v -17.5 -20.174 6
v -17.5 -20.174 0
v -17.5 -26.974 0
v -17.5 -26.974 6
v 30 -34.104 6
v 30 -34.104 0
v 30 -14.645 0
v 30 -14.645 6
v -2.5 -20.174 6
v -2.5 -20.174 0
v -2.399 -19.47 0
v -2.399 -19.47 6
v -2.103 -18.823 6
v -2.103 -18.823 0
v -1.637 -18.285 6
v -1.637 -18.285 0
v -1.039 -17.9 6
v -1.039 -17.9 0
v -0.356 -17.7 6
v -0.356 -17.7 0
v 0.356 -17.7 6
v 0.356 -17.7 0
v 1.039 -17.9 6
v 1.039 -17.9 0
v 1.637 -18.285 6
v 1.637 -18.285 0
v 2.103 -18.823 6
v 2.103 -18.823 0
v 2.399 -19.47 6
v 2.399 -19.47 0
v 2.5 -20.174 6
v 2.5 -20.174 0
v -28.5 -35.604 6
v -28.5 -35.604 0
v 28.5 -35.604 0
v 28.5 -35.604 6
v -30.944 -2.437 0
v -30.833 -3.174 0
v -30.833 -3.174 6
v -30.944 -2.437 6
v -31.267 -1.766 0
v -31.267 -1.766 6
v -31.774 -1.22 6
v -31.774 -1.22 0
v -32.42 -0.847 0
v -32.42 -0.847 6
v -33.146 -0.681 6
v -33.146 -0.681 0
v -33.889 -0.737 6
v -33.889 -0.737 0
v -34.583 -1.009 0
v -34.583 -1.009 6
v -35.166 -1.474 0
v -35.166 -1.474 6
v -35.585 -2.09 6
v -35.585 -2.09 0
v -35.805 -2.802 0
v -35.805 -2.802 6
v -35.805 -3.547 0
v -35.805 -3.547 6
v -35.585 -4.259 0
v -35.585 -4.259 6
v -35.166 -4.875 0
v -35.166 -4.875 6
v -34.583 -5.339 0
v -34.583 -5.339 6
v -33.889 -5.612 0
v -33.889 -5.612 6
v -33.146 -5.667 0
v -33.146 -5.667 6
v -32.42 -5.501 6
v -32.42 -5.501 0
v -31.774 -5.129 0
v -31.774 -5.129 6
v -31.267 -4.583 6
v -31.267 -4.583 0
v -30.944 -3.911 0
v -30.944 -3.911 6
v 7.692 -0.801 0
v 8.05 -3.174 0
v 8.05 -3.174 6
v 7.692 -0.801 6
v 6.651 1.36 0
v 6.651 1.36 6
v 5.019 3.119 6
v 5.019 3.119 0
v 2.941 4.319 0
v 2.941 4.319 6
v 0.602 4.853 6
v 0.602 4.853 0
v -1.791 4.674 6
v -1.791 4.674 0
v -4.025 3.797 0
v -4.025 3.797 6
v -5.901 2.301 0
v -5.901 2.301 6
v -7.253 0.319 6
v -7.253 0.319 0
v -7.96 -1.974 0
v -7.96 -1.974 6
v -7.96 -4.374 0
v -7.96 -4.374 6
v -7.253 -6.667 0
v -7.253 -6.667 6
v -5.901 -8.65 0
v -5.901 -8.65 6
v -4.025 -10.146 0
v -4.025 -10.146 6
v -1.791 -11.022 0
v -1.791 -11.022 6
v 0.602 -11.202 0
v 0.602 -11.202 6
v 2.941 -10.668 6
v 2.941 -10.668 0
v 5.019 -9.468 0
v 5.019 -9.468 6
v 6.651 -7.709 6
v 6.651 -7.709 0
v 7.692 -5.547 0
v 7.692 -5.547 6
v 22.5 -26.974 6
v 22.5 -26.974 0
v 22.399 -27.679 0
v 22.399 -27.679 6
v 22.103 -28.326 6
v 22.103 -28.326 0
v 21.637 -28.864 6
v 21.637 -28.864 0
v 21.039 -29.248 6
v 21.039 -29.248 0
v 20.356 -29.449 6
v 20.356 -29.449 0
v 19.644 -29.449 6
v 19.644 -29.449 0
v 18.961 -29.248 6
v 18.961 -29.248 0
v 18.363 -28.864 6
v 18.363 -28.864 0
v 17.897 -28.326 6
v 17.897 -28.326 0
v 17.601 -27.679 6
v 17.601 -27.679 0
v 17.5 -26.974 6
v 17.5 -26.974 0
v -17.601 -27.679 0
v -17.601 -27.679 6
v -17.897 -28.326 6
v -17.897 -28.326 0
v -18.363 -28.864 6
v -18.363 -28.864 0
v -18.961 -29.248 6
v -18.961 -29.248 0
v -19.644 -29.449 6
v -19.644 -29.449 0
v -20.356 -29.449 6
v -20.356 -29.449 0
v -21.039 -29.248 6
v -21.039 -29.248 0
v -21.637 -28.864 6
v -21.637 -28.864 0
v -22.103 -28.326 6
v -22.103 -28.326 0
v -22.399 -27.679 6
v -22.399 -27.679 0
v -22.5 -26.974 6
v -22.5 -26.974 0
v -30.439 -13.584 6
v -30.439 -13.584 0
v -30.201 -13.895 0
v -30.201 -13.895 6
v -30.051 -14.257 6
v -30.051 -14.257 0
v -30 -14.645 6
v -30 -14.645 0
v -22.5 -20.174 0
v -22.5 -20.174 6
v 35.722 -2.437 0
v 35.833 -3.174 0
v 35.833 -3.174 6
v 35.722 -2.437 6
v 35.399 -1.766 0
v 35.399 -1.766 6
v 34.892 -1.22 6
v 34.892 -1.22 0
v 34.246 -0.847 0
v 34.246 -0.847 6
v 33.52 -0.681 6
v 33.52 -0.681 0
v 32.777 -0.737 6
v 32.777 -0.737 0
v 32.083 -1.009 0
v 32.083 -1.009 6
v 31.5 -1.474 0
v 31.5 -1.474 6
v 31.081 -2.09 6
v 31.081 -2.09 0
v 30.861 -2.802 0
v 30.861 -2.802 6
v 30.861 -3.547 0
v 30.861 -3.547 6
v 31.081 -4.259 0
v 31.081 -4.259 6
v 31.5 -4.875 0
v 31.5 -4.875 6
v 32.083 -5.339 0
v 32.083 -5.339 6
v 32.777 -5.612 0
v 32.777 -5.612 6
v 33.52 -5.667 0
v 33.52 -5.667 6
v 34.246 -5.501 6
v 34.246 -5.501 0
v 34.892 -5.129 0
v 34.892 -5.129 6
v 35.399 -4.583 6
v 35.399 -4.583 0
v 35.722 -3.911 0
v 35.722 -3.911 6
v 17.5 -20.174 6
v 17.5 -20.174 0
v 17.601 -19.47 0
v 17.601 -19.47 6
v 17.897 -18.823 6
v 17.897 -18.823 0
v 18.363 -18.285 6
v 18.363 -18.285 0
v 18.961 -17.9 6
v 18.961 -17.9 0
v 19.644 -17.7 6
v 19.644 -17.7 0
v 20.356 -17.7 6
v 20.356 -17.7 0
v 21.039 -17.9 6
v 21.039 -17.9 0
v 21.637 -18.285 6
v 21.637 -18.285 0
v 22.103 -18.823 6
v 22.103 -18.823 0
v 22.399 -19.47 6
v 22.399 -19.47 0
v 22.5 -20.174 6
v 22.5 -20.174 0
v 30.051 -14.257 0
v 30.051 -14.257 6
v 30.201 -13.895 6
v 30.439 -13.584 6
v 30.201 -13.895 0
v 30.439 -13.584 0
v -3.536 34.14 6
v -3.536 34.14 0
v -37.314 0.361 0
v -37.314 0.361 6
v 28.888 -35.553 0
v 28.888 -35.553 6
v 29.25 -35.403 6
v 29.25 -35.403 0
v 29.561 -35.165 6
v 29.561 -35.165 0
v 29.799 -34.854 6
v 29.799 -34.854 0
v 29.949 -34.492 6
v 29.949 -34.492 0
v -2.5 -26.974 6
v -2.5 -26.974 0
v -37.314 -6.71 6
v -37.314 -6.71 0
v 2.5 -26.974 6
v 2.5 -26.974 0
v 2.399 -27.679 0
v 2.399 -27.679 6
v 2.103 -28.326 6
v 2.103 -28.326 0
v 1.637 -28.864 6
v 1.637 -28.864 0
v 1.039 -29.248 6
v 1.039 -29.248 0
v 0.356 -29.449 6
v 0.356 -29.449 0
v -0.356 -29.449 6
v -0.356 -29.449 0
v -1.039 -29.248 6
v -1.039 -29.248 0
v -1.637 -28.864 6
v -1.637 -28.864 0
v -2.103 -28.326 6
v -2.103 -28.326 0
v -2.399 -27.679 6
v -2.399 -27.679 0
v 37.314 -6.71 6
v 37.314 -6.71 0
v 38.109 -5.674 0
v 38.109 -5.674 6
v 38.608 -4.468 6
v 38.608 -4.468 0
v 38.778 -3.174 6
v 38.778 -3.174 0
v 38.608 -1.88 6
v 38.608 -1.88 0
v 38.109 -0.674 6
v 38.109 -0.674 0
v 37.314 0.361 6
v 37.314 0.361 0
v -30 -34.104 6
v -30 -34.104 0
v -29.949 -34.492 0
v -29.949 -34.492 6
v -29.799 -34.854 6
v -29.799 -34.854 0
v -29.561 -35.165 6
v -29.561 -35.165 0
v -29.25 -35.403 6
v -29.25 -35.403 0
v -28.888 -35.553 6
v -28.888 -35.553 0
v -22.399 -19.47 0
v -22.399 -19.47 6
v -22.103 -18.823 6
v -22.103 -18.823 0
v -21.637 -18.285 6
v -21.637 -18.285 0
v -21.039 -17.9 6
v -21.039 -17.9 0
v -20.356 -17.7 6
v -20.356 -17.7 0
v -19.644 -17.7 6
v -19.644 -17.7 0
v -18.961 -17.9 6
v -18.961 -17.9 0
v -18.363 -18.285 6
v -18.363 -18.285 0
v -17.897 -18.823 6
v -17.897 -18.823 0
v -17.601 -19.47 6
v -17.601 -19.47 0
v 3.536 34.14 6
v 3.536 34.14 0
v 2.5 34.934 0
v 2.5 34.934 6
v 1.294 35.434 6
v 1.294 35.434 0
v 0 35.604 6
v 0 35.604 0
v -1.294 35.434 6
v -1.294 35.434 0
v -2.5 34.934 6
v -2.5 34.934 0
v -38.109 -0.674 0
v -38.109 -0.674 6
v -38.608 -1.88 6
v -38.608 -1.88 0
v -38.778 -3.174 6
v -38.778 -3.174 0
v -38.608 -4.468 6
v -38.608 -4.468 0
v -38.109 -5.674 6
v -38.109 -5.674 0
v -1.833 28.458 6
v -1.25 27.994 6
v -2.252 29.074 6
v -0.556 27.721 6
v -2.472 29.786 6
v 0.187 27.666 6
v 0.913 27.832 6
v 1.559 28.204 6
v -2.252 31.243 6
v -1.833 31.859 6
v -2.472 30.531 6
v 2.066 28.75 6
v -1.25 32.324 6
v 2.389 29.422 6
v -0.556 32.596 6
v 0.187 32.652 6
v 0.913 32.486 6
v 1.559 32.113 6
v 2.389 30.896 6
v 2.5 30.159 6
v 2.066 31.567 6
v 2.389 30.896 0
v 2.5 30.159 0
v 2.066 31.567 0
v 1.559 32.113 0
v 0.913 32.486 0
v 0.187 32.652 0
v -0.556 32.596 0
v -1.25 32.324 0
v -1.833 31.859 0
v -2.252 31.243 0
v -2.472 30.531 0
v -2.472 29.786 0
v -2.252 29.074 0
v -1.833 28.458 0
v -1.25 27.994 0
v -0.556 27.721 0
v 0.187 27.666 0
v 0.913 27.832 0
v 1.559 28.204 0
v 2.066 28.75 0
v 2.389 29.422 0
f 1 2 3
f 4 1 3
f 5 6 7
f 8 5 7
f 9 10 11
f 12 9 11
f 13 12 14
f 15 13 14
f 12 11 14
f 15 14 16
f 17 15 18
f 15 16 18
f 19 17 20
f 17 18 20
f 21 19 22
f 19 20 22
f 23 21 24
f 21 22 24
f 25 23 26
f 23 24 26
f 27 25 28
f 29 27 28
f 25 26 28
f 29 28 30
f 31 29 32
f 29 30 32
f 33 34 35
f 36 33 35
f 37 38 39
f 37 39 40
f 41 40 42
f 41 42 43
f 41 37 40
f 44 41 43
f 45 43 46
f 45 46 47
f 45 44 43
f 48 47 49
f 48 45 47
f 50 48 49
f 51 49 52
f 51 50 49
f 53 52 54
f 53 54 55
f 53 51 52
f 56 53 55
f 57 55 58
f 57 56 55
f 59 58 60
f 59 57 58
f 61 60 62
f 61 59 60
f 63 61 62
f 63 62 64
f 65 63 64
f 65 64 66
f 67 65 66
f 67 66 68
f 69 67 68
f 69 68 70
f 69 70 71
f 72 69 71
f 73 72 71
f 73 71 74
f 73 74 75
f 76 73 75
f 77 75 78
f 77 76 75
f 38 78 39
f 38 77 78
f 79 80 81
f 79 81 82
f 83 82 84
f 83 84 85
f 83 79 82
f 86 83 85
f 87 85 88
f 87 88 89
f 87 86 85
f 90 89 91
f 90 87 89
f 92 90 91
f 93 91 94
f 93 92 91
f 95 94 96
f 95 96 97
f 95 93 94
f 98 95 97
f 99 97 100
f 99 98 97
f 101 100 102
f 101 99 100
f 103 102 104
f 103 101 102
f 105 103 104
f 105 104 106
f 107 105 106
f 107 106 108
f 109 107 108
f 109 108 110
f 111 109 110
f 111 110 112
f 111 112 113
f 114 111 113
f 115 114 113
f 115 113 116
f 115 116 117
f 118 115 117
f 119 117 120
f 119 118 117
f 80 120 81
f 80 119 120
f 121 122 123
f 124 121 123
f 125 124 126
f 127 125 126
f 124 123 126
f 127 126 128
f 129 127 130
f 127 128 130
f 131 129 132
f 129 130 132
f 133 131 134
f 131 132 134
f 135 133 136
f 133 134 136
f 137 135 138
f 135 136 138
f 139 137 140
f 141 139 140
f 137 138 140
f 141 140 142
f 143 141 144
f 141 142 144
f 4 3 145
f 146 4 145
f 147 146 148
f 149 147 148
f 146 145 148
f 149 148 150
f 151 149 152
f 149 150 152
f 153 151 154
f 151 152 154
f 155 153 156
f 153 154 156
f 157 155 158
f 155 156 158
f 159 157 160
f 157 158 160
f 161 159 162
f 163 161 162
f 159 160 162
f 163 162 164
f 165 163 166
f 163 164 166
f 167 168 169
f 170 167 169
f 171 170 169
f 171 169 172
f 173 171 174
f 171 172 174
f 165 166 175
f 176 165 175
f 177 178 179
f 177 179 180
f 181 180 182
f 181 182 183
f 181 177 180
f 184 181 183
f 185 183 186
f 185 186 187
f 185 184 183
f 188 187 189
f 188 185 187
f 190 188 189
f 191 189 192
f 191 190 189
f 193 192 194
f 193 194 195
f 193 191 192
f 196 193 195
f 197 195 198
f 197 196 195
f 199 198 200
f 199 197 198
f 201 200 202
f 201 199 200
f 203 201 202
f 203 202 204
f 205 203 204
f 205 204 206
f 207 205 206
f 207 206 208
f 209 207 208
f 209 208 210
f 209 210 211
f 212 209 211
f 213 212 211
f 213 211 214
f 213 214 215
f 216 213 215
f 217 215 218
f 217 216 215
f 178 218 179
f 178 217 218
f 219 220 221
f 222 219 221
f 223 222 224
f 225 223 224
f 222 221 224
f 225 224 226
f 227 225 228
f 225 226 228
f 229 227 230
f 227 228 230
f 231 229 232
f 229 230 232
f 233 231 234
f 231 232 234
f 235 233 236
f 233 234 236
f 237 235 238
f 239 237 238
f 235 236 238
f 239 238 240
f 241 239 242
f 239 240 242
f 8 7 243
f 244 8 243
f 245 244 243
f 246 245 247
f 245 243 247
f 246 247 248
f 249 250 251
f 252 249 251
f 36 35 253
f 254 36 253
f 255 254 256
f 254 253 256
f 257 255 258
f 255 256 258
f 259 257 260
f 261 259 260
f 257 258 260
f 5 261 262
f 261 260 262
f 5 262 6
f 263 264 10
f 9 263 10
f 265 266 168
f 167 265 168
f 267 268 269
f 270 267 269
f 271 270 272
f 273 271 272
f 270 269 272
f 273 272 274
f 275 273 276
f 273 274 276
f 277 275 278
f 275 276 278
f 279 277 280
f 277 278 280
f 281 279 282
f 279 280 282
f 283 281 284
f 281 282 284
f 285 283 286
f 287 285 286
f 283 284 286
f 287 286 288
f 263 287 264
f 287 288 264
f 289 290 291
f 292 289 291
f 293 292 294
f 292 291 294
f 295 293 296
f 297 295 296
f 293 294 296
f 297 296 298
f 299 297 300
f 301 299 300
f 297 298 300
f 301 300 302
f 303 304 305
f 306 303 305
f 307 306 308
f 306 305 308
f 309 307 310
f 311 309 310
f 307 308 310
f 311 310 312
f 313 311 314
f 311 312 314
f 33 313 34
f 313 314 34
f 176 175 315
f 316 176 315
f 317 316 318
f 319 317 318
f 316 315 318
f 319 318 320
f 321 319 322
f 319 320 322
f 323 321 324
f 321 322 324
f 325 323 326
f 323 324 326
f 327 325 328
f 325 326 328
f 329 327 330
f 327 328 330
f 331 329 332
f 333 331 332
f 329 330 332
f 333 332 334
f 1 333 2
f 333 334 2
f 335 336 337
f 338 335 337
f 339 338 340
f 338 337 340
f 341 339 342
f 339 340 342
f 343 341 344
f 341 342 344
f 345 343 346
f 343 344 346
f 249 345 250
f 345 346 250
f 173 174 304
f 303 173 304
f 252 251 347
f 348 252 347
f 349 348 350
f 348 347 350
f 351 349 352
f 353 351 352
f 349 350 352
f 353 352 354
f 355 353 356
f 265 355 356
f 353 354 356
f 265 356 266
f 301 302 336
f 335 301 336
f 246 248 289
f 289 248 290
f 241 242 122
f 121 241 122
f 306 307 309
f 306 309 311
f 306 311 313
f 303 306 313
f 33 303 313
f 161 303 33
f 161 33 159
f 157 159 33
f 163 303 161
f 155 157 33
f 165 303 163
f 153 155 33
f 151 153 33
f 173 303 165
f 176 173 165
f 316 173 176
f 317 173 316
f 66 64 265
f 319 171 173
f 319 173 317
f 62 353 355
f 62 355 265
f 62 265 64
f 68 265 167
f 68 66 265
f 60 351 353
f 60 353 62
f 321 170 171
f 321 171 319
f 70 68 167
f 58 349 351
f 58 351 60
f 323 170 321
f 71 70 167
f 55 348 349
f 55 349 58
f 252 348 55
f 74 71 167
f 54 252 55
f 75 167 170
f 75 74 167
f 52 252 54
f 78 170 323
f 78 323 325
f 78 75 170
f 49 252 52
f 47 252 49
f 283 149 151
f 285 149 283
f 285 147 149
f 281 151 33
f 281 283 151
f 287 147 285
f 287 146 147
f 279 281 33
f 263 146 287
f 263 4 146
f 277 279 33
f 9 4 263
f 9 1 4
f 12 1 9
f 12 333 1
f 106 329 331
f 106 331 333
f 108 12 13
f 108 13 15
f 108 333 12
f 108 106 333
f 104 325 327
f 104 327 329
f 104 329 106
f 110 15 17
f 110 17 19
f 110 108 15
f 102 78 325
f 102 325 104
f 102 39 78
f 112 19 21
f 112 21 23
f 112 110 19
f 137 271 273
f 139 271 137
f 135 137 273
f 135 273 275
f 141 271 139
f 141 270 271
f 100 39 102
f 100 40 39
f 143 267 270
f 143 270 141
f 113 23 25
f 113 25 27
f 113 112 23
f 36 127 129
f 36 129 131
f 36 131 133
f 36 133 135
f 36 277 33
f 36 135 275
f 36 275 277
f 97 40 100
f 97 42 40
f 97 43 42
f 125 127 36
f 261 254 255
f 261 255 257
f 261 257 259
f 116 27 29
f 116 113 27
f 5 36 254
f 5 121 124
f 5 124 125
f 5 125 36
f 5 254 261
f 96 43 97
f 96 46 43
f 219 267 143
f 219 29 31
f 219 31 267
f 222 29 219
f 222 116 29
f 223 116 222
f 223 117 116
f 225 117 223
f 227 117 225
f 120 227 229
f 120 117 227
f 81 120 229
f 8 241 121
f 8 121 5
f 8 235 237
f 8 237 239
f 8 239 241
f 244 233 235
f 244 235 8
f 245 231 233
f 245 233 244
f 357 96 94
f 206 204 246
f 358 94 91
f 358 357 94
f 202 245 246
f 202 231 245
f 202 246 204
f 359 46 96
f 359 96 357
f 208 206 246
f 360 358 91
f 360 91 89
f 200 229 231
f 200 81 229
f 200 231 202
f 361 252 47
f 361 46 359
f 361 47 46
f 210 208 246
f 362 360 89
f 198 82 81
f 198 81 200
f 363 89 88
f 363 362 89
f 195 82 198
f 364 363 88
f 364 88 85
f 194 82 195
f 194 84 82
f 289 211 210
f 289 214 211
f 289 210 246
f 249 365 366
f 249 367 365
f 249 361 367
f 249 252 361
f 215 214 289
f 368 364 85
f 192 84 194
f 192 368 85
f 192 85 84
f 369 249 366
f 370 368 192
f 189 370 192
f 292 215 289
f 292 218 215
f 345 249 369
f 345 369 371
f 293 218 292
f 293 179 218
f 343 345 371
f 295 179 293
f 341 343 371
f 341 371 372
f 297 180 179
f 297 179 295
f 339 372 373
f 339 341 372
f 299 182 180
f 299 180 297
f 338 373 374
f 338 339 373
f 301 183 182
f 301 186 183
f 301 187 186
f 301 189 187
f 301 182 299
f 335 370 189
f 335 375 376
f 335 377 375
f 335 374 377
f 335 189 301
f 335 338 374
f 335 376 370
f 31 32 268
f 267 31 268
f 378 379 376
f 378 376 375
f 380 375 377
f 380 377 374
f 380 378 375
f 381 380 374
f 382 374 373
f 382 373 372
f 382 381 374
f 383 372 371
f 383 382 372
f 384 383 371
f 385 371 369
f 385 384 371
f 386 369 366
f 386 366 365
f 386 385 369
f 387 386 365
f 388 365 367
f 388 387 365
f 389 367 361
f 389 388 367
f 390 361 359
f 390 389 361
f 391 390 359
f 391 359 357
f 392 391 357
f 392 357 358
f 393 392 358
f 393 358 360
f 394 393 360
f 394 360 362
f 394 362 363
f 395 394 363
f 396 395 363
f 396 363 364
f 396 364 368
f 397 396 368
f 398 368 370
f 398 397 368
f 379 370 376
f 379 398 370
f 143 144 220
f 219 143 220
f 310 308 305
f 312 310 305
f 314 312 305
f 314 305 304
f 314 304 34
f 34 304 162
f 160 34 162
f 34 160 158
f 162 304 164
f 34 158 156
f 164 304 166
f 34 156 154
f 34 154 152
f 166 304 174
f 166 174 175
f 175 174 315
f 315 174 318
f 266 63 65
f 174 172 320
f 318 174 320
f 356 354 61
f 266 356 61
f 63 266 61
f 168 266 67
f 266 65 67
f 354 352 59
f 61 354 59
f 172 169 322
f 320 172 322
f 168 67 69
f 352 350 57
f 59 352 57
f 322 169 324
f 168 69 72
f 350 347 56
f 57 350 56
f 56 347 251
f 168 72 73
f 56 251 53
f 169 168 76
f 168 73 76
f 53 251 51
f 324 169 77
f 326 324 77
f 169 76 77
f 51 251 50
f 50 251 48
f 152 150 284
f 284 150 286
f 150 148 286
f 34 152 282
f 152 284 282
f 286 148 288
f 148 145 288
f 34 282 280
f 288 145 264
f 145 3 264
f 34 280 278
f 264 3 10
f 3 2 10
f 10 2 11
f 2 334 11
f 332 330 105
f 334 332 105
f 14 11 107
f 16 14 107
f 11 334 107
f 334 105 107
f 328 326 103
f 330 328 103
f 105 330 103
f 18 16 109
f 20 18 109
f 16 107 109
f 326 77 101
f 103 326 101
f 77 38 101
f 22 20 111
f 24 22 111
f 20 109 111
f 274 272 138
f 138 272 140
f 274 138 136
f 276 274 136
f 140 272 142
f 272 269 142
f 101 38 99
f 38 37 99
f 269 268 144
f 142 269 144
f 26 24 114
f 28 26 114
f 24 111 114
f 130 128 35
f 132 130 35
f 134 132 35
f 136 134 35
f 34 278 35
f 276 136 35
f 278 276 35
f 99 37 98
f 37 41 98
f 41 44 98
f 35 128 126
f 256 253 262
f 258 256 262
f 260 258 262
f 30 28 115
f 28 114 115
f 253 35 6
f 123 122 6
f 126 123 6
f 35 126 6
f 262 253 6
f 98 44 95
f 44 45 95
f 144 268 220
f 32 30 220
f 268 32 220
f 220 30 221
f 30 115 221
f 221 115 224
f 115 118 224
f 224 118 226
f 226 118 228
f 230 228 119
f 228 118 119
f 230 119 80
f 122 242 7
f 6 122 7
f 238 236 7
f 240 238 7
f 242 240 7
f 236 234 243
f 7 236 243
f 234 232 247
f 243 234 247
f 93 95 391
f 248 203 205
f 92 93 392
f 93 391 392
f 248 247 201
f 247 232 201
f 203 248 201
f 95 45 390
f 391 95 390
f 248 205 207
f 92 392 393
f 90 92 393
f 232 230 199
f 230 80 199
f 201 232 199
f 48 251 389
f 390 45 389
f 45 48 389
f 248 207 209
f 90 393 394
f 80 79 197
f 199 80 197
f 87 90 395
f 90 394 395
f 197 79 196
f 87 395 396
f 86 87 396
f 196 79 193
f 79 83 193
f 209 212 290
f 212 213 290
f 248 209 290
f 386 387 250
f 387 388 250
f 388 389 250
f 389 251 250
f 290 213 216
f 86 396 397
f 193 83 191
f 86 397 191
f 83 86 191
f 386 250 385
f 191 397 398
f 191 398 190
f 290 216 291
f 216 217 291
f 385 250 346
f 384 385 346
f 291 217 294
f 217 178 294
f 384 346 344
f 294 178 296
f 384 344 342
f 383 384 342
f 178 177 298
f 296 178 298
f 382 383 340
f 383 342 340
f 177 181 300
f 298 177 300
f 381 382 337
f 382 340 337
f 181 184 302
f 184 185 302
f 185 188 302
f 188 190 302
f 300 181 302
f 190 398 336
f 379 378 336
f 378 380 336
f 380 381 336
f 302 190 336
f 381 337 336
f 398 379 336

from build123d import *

# Parameters (mm, degrees)
F0_R     = 4.6
F0_R_2   = 8.05
F0_R_3   = 2.5
F1_DEPTH = 6


# Not quite as in the source:
# - ends of sketch curves that miss each other by under 0.0002 mm in the source are joined


with BuildPart() as f1:
    # F0 (on Top) → F1 (new body)
    with BuildSketch(Plane.XY):
        with BuildLine():
            ThreePointArc((-30, -34.104246), (-29.5606601718, -35.1649061718), (-28.5, -35.604246))
            Line((-28.5, -35.604246), (28.5, -35.604246))
            ThreePointArc((28.5, -35.604246), (29.5606601718, -35.1649061718), (30, -34.104246))
            Line((30, -34.104246), (30, -14.645125))
            ThreePointArc((30, -14.645125), (30.1141807012, -14.0710998515), (30.4393398282, -13.5844648282))
            Line((30.4393398282, -13.5844648282), (37.314025, -6.70978))
            ThreePointArc((37.314025, -6.70978), (38.778491, -3.174246), (37.3140249059, 0.3612879059))
            Line((37.3140249059, 0.3612879059), (3.535534, 34.139779))
            ThreePointArc((3.535534, 34.139779), (0, 35.604245), (-3.5355339059, 34.1397789059))
            Line((-3.5355339059, 34.1397789059), (-37.314025, 0.361288))
            ThreePointArc((-37.314025, 0.361288), (-38.778491, -3.174246), (-37.3140249059, -6.7097799059))
            Line((-37.3140249059, -6.7097799059), (-30.43934, -13.584465))
            ThreePointArc((-30.43934, -13.584465), (-30.1141807012, -14.0710998515), (-30, -14.645125))
            Line((-30, -14.645125), (-30, -34.104246))
        make_face()
        with BuildLine():
            ThreePointArc((-24.6, -20.174246), (-20, -15.574246), (-15.4, -20.174246))
            Line((-15.4, -20.174246), (-15.4, -26.974246))
            ThreePointArc((-15.4, -26.974246), (-20, -31.574246), (-24.6, -26.974246))
            Line((-24.6, -26.974246), (-24.6, -20.174246))
        make_face(mode=Mode.SUBTRACT)
        with Locations((-33.333, -3.174246)):
            Circle(F0_R, mode=Mode.SUBTRACT)
        with BuildLine():
            ThreePointArc((4.6, -26.974246), (0, -31.574246), (-4.6, -26.974246))
            Line((-4.6, -26.974246), (-4.6, -20.174246))
            ThreePointArc((-4.6, -20.174246), (0, -15.574246), (4.6, -20.174246))
            Line((4.6, -20.174246), (4.6, -26.974246))
        make_face(mode=Mode.SUBTRACT)
        with BuildLine():
            ThreePointArc((24.6, -26.974246), (20, -31.574246), (15.4, -26.974246))
            Line((15.4, -26.974246), (15.4, -20.174246))
            ThreePointArc((15.4, -20.174246), (20, -15.574246), (24.6, -20.174246))
            Line((24.6, -20.174246), (24.6, -26.974246))
        make_face(mode=Mode.SUBTRACT)
        with Locations((0, -3.174246)):
            Circle(F0_R_2, mode=Mode.SUBTRACT)
        with Locations((33.333, -3.174246)):
            Circle(F0_R, mode=Mode.SUBTRACT)
        with Locations((0, 30.158782)):
            Circle(F0_R, mode=Mode.SUBTRACT)
        with Locations((-33.333, -3.174246)):
            Circle(F0_R)
        with Locations((-33.333, -3.174246)):
            Circle(F0_R_3, mode=Mode.SUBTRACT)
        with Locations((0, 30.158782)):
            Circle(F0_R)
        with Locations((0, 30.158782)):
            Circle(F0_R_3, mode=Mode.SUBTRACT)
        with Locations((33.333, -3.174246)):
            Circle(F0_R)
        with Locations((33.333, -3.174246)):
            Circle(F0_R_3, mode=Mode.SUBTRACT)
        with BuildLine():
            Line((15.4, -20.174246), (15.4, -26.974246))
            ThreePointArc((15.4, -26.974246), (20, -31.574246), (24.6, -26.974246))
            Line((24.6, -26.974246), (24.6, -20.174246))
            ThreePointArc((24.6, -20.174246), (20, -15.574246), (15.4, -20.174246))
        make_face()
        with BuildLine():
            ThreePointArc((22.5, -26.974246), (20, -29.474246), (17.5, -26.974246))
            Line((17.5, -26.974246), (17.5, -20.174246))
            ThreePointArc((17.5, -20.174246), (20, -17.674246), (22.5, -20.174246))
            Line((22.5, -20.174246), (22.5, -26.974246))
        make_face(mode=Mode.SUBTRACT)
        with BuildLine():
            Line((-4.6, -20.174246), (-4.6, -26.974246))
            ThreePointArc((-4.6, -26.974246), (0, -31.574246), (4.6, -26.974246))
            Line((4.6, -26.974246), (4.6, -20.174246))
            ThreePointArc((4.6, -20.174246), (0, -15.574246), (-4.6, -20.174246))
        make_face()
        with BuildLine():
            ThreePointArc((2.5, -26.974246), (0, -29.474246), (-2.5, -26.974246))
            Line((-2.5, -26.974246), (-2.5, -20.174246))
            ThreePointArc((-2.5, -20.174246), (0, -17.674246), (2.5, -20.174246))
            Line((2.5, -20.174246), (2.5, -26.974246))
        make_face(mode=Mode.SUBTRACT)
        with BuildLine():
            Line((-15.4, -26.974246), (-15.4, -20.174246))
            ThreePointArc((-15.4, -20.174246), (-20, -15.574246), (-24.6, -20.174246))
            Line((-24.6, -20.174246), (-24.6, -26.974246))
            ThreePointArc((-24.6, -26.974246), (-20, -31.574246), (-15.4, -26.974246))
        make_face()
        with BuildLine():
            ThreePointArc((-17.5, -26.974246), (-20, -29.474246), (-22.5, -26.974246))
            Line((-22.5, -26.974246), (-22.5, -20.174246))
            ThreePointArc((-22.5, -20.174246), (-20, -17.674246), (-17.5, -20.174246))
            Line((-17.5, -20.174246), (-17.5, -26.974246))
        make_face(mode=Mode.SUBTRACT)
    extrude(amount=F1_DEPTH)


solid = f1.part
